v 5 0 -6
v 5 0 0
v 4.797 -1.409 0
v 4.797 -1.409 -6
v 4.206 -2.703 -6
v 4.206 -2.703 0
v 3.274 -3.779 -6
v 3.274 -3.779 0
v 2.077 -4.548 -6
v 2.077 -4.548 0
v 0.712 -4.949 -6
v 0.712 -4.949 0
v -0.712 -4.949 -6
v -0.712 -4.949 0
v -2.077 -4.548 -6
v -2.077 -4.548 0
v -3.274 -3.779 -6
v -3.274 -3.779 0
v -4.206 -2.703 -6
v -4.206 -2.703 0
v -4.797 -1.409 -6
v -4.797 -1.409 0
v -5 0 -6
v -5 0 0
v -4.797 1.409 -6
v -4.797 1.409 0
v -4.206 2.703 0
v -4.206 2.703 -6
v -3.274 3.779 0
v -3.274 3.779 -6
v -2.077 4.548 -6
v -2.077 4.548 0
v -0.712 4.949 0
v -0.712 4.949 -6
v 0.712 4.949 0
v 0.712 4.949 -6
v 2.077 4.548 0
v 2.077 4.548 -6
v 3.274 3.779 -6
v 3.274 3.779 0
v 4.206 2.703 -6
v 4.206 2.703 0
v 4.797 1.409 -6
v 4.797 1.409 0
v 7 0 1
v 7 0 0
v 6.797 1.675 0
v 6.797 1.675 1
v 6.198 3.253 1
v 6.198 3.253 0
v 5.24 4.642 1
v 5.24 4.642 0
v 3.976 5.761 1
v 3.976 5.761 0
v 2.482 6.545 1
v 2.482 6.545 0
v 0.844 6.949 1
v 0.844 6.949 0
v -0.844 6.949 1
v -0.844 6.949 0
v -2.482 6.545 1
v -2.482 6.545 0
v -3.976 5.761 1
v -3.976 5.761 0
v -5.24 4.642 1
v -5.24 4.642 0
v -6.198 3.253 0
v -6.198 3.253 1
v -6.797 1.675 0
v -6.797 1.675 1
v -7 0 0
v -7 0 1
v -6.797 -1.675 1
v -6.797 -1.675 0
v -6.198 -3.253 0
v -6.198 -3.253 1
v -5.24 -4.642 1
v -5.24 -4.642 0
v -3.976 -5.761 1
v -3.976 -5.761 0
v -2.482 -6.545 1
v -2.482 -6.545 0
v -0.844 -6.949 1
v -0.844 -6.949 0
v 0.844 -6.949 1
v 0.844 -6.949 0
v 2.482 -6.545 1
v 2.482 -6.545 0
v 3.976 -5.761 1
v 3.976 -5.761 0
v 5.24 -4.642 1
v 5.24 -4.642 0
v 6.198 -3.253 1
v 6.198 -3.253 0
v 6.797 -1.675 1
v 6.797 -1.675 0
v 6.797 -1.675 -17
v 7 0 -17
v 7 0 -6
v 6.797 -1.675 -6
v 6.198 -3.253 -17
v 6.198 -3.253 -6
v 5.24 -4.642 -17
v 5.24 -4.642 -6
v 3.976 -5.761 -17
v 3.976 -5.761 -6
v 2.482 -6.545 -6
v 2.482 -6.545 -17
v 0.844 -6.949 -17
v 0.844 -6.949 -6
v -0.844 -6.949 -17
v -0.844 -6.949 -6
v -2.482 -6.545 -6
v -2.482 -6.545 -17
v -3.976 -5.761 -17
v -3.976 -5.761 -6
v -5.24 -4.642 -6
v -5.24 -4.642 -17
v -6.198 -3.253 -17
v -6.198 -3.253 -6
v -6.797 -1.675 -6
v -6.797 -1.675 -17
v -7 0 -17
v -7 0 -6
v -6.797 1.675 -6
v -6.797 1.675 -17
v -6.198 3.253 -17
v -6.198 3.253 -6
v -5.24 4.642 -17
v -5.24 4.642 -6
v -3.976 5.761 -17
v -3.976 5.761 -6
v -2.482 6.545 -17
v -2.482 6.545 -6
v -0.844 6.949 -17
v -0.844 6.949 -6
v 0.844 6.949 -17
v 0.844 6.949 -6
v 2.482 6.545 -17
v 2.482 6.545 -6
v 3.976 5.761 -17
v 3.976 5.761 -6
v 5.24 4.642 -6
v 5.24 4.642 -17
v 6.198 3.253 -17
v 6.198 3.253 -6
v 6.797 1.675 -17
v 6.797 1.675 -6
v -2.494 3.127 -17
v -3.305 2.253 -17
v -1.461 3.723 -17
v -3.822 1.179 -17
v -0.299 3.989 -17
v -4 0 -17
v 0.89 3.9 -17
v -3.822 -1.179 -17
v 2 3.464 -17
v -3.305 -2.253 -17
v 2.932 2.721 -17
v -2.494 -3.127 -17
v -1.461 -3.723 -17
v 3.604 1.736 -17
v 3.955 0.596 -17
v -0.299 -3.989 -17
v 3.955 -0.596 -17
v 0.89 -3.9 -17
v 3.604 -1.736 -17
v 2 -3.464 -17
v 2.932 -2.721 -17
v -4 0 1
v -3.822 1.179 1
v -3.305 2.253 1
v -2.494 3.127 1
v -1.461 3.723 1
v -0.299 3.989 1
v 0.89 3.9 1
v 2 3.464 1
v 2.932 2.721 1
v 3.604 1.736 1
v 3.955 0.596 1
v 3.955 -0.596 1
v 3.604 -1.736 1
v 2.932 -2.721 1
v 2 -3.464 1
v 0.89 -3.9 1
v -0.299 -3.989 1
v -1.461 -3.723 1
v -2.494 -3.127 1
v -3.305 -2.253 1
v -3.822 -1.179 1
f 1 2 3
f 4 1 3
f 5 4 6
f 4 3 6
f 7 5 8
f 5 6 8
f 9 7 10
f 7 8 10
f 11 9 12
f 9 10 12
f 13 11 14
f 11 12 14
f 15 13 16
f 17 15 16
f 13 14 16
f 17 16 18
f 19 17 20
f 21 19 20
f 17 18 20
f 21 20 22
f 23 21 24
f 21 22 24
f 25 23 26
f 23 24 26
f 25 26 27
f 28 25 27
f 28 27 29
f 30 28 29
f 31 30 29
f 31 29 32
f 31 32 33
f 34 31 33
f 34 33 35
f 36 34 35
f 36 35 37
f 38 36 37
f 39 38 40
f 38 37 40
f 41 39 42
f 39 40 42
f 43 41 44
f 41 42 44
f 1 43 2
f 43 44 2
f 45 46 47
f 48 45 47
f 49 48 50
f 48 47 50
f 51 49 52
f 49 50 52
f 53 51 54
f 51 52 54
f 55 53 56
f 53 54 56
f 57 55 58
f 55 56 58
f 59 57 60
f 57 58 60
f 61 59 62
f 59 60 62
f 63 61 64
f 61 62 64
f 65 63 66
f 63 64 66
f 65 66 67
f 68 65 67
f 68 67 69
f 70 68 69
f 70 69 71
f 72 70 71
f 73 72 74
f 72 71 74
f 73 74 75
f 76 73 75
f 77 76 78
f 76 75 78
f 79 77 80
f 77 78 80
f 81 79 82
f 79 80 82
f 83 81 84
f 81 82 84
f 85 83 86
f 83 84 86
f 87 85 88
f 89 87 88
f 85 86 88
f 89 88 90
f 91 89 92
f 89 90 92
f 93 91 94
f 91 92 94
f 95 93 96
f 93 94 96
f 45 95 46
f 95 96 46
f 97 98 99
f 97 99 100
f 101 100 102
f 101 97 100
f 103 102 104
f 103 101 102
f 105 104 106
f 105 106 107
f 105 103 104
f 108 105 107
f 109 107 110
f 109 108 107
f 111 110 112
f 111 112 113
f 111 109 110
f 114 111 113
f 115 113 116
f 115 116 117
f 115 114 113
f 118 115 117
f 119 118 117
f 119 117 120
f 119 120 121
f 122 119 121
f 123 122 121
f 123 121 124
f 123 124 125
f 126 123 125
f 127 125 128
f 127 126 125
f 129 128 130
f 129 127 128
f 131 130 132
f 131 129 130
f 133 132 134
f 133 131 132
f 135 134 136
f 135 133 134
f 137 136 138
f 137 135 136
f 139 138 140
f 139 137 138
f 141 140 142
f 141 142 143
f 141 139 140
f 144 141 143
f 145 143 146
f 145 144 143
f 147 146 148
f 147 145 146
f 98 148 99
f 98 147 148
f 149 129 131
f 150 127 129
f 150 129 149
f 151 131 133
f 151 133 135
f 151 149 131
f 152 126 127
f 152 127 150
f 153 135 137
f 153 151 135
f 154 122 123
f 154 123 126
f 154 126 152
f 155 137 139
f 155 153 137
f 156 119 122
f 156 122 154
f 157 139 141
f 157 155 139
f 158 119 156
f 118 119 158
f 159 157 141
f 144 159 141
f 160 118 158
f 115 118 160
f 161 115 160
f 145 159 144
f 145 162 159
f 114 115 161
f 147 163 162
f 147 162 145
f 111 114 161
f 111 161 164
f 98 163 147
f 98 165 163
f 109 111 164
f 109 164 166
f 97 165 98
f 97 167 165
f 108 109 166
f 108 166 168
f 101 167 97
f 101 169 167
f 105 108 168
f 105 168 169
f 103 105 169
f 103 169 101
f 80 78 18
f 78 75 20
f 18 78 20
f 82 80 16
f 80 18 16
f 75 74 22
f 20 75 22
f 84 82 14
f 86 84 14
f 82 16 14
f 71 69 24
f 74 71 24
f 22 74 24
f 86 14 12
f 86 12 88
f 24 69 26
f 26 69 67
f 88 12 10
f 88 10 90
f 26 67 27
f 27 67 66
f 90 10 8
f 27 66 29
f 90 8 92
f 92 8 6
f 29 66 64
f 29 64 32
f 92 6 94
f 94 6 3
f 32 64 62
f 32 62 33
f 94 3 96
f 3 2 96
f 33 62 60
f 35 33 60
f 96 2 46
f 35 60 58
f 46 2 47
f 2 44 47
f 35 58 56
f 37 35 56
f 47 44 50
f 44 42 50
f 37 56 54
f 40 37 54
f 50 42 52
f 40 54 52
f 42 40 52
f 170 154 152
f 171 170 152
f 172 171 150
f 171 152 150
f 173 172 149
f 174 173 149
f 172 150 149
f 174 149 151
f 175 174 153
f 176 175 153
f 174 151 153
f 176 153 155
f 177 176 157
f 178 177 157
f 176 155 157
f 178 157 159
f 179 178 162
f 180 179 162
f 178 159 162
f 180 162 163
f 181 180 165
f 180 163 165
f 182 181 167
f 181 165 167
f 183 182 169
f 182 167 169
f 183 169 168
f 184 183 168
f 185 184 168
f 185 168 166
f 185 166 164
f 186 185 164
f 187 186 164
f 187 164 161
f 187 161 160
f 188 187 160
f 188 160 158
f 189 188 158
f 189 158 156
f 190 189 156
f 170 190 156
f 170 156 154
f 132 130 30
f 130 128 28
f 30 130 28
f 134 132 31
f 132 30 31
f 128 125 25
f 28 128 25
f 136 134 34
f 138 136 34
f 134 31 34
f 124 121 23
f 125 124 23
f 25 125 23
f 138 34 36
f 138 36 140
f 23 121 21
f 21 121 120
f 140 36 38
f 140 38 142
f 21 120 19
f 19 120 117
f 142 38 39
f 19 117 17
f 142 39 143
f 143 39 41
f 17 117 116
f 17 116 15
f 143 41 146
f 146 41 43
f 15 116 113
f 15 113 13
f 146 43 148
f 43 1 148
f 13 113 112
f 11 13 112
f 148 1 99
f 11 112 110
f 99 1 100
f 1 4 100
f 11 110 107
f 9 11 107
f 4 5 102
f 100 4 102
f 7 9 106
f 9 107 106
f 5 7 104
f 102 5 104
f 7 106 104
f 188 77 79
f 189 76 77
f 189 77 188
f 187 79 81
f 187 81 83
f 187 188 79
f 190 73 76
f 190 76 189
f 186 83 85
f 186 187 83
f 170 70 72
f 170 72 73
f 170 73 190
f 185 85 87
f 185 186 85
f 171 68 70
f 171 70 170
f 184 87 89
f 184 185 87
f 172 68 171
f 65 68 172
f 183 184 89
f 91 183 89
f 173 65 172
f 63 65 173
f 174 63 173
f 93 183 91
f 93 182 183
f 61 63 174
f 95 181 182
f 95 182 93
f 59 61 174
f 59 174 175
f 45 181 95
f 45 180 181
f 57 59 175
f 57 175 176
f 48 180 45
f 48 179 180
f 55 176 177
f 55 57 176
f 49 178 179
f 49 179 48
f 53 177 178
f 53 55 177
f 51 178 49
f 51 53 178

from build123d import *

# Parameters (mm, degrees)
SKETCH_1_R          = 7
EXTRUDE_1_DEPTH     = 1
SKETCH_2_R          = 5
EXTRUDE_2_DEPTH     = 6
EXTRUDE_START       = 11
SKETCH_3_R          = 7
EXTRUDE_3_DEPTH     = 11
SKETCH_4_R          = 4
CUT_EXTRUDE_1_DEPTH = 21.542638584


with BuildPart() as part:
    # Эскиз1 → Бобышка-Вытянуть1 (new body)
    with BuildSketch(Plane.XY):
        Circle(SKETCH_1_R)
    extrude(amount=EXTRUDE_1_DEPTH)

    # Эскиз2 → Бобышка-Вытянуть2 (add)
    with BuildSketch(Plane(origin=(0, 0, 0), x_dir=(-1, 0, 0), z_dir=(0, 0, -1))):
        with Locations(Location((0, 0, 0), (0, 0, 180))):
            Circle(SKETCH_2_R)
    extrude(amount=EXTRUDE_2_DEPTH)

    # Эскиз3 → Бобышка-Вытянуть3 (add)
    with BuildSketch(Plane(origin=(0, 0, -6), x_dir=(-1, 0, 0), z_dir=(0, 0, -1)).offset(EXTRUDE_START)):
        with Locations(Location((0, 0, 0), (0, 0, 180))):
            Circle(SKETCH_3_R)
    extrude(amount=-EXTRUDE_3_DEPTH)

    # Эскиз4 → Вырез-Вытянуть1 (cut, through all)
    with BuildSketch(Plane(origin=(0, 0, -17), x_dir=(-1, 0, 0), z_dir=(0, 0, -1))):
        Circle(SKETCH_4_R)
    extrude(amount=-CUT_EXTRUDE_1_DEPTH, mode=Mode.SUBTRACT)


solid = part.part
